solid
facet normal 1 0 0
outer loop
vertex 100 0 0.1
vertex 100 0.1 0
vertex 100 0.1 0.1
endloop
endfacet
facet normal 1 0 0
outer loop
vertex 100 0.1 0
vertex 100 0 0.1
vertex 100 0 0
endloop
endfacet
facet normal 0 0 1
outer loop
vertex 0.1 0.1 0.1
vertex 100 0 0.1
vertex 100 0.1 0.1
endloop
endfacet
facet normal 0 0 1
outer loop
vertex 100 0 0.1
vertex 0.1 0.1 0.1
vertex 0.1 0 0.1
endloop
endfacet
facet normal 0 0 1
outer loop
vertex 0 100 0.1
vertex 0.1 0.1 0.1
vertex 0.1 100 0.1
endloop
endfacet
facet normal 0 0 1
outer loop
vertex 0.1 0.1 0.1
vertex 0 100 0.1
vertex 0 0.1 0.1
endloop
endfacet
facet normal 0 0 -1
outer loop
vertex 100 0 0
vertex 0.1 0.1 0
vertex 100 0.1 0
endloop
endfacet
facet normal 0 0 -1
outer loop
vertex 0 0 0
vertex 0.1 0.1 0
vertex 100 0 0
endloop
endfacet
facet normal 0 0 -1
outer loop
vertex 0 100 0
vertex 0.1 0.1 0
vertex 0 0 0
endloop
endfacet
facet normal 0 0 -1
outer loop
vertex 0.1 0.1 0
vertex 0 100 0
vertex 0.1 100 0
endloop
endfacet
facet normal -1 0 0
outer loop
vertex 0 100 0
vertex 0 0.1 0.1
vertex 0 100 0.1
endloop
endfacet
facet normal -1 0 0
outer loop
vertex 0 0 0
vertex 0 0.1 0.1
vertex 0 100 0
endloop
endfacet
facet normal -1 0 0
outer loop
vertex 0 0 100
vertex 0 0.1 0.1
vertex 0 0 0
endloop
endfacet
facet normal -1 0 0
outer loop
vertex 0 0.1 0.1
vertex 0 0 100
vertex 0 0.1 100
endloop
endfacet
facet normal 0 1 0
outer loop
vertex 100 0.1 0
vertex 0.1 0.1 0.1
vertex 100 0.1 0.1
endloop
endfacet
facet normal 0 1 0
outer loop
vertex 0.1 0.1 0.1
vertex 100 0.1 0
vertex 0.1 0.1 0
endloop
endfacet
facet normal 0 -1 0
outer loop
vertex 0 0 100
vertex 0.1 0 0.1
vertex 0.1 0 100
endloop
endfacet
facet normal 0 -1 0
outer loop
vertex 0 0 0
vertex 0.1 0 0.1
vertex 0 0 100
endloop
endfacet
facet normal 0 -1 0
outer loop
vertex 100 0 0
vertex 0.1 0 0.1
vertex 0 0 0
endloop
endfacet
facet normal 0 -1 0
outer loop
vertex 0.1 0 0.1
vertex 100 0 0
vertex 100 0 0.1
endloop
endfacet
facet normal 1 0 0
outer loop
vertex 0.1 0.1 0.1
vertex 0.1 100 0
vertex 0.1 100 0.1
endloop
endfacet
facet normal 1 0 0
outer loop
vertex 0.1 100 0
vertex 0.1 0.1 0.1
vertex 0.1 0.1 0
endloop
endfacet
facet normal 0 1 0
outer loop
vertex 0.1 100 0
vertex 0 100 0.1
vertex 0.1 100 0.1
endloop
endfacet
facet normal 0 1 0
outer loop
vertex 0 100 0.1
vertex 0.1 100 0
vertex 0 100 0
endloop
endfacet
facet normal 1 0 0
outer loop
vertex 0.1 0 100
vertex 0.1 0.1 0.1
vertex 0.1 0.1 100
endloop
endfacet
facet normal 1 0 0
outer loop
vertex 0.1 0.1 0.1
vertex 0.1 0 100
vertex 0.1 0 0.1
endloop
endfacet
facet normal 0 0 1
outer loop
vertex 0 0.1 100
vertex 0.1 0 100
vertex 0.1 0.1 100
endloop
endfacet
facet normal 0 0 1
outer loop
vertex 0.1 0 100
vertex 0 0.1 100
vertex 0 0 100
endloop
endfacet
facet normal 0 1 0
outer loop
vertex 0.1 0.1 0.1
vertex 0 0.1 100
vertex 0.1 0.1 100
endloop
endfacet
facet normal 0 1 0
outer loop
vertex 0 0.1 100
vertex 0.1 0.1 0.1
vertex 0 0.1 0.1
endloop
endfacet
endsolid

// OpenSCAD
    // Combined Scene

    // Permanent Model
    
    // Permanent Model (Black)
    color([0, 0, 0]) {
        // Your permanent model code here
        cube([100,0.1,0.1], center = false);
        cube([0.1,100,0.1], center = false);
        cube([0.1,0.1,100], center = false);
    }
    

    // Dynamic Model
    translate([0, 0, 0]) {
    // Curved Chair Seat
    difference() {
        hull() {
            translate([-35, -30, 0]) circle(r=35);
            translate([35, -30, 0]) circle(r=35);
            translate([-35, 30, 0]) circle(r=35);
            translate([35, 30, 0]) circle(r=35);
        }
        translate([0, 0, -5]) cube([70, 60, 10], center=true);
    }
    
    // Taller Chair Backrest for Lumbar Support
    translate([0, -50, 10])
        rotate([-10, 0, 0])
        scale([1, 1.5, 1])
        hull() {
            translate([-35, 0, 0]) circle(r=35);
            translate([35, 0, 0]) circle(r=35);
        }

    // Curved Armrests
    translate([-40, 0, 10]) {
        rotate([0, 0, -30])
        hull() {
            translate([-10, 0, 0]) circle(r=10);
            translate([0, -15, 0]) circle(r=10);
            translate([-30, 0, 0]) circle(r=10);
        }
    }
    
    translate([40, 0, 10]) {
        rotate([0, 0, 30])
        hull() {
            translate([-10, 0, 0]) circle(r=10);
            translate([0, -15, 0]) circle(r=10);
            translate([-30, 0, 0]) circle(r=10);
        }
    }

    // Tapered Legs for a Sleek Look
    for (x = [-30, 30]) {
        for (y = [-25, 25]) {
            translate([x, y, -20]) {
                linear_extrude(height=25) {
                    polygon(points=[[0, 0], [5, -15], [3, -15], [8, 0]]);
                }
            }
        }
    }
    
    // Optional Cushioning
    translate([0, 0, 5]) {
        color("gray") {
            difference() {
                hull() {
                    translate([-30, -25, 0]) circle(r=30);
                    translate([30, -25, 0]) circle(r=30);
                    translate([-30, 25, 0]) circle(r=30);
                    translate([30, 25, 0]) circle(r=30);
                }
                translate([0, 0, -2]) cube([70, 60, 5], center=true);
            }
        }
    }
}
    
